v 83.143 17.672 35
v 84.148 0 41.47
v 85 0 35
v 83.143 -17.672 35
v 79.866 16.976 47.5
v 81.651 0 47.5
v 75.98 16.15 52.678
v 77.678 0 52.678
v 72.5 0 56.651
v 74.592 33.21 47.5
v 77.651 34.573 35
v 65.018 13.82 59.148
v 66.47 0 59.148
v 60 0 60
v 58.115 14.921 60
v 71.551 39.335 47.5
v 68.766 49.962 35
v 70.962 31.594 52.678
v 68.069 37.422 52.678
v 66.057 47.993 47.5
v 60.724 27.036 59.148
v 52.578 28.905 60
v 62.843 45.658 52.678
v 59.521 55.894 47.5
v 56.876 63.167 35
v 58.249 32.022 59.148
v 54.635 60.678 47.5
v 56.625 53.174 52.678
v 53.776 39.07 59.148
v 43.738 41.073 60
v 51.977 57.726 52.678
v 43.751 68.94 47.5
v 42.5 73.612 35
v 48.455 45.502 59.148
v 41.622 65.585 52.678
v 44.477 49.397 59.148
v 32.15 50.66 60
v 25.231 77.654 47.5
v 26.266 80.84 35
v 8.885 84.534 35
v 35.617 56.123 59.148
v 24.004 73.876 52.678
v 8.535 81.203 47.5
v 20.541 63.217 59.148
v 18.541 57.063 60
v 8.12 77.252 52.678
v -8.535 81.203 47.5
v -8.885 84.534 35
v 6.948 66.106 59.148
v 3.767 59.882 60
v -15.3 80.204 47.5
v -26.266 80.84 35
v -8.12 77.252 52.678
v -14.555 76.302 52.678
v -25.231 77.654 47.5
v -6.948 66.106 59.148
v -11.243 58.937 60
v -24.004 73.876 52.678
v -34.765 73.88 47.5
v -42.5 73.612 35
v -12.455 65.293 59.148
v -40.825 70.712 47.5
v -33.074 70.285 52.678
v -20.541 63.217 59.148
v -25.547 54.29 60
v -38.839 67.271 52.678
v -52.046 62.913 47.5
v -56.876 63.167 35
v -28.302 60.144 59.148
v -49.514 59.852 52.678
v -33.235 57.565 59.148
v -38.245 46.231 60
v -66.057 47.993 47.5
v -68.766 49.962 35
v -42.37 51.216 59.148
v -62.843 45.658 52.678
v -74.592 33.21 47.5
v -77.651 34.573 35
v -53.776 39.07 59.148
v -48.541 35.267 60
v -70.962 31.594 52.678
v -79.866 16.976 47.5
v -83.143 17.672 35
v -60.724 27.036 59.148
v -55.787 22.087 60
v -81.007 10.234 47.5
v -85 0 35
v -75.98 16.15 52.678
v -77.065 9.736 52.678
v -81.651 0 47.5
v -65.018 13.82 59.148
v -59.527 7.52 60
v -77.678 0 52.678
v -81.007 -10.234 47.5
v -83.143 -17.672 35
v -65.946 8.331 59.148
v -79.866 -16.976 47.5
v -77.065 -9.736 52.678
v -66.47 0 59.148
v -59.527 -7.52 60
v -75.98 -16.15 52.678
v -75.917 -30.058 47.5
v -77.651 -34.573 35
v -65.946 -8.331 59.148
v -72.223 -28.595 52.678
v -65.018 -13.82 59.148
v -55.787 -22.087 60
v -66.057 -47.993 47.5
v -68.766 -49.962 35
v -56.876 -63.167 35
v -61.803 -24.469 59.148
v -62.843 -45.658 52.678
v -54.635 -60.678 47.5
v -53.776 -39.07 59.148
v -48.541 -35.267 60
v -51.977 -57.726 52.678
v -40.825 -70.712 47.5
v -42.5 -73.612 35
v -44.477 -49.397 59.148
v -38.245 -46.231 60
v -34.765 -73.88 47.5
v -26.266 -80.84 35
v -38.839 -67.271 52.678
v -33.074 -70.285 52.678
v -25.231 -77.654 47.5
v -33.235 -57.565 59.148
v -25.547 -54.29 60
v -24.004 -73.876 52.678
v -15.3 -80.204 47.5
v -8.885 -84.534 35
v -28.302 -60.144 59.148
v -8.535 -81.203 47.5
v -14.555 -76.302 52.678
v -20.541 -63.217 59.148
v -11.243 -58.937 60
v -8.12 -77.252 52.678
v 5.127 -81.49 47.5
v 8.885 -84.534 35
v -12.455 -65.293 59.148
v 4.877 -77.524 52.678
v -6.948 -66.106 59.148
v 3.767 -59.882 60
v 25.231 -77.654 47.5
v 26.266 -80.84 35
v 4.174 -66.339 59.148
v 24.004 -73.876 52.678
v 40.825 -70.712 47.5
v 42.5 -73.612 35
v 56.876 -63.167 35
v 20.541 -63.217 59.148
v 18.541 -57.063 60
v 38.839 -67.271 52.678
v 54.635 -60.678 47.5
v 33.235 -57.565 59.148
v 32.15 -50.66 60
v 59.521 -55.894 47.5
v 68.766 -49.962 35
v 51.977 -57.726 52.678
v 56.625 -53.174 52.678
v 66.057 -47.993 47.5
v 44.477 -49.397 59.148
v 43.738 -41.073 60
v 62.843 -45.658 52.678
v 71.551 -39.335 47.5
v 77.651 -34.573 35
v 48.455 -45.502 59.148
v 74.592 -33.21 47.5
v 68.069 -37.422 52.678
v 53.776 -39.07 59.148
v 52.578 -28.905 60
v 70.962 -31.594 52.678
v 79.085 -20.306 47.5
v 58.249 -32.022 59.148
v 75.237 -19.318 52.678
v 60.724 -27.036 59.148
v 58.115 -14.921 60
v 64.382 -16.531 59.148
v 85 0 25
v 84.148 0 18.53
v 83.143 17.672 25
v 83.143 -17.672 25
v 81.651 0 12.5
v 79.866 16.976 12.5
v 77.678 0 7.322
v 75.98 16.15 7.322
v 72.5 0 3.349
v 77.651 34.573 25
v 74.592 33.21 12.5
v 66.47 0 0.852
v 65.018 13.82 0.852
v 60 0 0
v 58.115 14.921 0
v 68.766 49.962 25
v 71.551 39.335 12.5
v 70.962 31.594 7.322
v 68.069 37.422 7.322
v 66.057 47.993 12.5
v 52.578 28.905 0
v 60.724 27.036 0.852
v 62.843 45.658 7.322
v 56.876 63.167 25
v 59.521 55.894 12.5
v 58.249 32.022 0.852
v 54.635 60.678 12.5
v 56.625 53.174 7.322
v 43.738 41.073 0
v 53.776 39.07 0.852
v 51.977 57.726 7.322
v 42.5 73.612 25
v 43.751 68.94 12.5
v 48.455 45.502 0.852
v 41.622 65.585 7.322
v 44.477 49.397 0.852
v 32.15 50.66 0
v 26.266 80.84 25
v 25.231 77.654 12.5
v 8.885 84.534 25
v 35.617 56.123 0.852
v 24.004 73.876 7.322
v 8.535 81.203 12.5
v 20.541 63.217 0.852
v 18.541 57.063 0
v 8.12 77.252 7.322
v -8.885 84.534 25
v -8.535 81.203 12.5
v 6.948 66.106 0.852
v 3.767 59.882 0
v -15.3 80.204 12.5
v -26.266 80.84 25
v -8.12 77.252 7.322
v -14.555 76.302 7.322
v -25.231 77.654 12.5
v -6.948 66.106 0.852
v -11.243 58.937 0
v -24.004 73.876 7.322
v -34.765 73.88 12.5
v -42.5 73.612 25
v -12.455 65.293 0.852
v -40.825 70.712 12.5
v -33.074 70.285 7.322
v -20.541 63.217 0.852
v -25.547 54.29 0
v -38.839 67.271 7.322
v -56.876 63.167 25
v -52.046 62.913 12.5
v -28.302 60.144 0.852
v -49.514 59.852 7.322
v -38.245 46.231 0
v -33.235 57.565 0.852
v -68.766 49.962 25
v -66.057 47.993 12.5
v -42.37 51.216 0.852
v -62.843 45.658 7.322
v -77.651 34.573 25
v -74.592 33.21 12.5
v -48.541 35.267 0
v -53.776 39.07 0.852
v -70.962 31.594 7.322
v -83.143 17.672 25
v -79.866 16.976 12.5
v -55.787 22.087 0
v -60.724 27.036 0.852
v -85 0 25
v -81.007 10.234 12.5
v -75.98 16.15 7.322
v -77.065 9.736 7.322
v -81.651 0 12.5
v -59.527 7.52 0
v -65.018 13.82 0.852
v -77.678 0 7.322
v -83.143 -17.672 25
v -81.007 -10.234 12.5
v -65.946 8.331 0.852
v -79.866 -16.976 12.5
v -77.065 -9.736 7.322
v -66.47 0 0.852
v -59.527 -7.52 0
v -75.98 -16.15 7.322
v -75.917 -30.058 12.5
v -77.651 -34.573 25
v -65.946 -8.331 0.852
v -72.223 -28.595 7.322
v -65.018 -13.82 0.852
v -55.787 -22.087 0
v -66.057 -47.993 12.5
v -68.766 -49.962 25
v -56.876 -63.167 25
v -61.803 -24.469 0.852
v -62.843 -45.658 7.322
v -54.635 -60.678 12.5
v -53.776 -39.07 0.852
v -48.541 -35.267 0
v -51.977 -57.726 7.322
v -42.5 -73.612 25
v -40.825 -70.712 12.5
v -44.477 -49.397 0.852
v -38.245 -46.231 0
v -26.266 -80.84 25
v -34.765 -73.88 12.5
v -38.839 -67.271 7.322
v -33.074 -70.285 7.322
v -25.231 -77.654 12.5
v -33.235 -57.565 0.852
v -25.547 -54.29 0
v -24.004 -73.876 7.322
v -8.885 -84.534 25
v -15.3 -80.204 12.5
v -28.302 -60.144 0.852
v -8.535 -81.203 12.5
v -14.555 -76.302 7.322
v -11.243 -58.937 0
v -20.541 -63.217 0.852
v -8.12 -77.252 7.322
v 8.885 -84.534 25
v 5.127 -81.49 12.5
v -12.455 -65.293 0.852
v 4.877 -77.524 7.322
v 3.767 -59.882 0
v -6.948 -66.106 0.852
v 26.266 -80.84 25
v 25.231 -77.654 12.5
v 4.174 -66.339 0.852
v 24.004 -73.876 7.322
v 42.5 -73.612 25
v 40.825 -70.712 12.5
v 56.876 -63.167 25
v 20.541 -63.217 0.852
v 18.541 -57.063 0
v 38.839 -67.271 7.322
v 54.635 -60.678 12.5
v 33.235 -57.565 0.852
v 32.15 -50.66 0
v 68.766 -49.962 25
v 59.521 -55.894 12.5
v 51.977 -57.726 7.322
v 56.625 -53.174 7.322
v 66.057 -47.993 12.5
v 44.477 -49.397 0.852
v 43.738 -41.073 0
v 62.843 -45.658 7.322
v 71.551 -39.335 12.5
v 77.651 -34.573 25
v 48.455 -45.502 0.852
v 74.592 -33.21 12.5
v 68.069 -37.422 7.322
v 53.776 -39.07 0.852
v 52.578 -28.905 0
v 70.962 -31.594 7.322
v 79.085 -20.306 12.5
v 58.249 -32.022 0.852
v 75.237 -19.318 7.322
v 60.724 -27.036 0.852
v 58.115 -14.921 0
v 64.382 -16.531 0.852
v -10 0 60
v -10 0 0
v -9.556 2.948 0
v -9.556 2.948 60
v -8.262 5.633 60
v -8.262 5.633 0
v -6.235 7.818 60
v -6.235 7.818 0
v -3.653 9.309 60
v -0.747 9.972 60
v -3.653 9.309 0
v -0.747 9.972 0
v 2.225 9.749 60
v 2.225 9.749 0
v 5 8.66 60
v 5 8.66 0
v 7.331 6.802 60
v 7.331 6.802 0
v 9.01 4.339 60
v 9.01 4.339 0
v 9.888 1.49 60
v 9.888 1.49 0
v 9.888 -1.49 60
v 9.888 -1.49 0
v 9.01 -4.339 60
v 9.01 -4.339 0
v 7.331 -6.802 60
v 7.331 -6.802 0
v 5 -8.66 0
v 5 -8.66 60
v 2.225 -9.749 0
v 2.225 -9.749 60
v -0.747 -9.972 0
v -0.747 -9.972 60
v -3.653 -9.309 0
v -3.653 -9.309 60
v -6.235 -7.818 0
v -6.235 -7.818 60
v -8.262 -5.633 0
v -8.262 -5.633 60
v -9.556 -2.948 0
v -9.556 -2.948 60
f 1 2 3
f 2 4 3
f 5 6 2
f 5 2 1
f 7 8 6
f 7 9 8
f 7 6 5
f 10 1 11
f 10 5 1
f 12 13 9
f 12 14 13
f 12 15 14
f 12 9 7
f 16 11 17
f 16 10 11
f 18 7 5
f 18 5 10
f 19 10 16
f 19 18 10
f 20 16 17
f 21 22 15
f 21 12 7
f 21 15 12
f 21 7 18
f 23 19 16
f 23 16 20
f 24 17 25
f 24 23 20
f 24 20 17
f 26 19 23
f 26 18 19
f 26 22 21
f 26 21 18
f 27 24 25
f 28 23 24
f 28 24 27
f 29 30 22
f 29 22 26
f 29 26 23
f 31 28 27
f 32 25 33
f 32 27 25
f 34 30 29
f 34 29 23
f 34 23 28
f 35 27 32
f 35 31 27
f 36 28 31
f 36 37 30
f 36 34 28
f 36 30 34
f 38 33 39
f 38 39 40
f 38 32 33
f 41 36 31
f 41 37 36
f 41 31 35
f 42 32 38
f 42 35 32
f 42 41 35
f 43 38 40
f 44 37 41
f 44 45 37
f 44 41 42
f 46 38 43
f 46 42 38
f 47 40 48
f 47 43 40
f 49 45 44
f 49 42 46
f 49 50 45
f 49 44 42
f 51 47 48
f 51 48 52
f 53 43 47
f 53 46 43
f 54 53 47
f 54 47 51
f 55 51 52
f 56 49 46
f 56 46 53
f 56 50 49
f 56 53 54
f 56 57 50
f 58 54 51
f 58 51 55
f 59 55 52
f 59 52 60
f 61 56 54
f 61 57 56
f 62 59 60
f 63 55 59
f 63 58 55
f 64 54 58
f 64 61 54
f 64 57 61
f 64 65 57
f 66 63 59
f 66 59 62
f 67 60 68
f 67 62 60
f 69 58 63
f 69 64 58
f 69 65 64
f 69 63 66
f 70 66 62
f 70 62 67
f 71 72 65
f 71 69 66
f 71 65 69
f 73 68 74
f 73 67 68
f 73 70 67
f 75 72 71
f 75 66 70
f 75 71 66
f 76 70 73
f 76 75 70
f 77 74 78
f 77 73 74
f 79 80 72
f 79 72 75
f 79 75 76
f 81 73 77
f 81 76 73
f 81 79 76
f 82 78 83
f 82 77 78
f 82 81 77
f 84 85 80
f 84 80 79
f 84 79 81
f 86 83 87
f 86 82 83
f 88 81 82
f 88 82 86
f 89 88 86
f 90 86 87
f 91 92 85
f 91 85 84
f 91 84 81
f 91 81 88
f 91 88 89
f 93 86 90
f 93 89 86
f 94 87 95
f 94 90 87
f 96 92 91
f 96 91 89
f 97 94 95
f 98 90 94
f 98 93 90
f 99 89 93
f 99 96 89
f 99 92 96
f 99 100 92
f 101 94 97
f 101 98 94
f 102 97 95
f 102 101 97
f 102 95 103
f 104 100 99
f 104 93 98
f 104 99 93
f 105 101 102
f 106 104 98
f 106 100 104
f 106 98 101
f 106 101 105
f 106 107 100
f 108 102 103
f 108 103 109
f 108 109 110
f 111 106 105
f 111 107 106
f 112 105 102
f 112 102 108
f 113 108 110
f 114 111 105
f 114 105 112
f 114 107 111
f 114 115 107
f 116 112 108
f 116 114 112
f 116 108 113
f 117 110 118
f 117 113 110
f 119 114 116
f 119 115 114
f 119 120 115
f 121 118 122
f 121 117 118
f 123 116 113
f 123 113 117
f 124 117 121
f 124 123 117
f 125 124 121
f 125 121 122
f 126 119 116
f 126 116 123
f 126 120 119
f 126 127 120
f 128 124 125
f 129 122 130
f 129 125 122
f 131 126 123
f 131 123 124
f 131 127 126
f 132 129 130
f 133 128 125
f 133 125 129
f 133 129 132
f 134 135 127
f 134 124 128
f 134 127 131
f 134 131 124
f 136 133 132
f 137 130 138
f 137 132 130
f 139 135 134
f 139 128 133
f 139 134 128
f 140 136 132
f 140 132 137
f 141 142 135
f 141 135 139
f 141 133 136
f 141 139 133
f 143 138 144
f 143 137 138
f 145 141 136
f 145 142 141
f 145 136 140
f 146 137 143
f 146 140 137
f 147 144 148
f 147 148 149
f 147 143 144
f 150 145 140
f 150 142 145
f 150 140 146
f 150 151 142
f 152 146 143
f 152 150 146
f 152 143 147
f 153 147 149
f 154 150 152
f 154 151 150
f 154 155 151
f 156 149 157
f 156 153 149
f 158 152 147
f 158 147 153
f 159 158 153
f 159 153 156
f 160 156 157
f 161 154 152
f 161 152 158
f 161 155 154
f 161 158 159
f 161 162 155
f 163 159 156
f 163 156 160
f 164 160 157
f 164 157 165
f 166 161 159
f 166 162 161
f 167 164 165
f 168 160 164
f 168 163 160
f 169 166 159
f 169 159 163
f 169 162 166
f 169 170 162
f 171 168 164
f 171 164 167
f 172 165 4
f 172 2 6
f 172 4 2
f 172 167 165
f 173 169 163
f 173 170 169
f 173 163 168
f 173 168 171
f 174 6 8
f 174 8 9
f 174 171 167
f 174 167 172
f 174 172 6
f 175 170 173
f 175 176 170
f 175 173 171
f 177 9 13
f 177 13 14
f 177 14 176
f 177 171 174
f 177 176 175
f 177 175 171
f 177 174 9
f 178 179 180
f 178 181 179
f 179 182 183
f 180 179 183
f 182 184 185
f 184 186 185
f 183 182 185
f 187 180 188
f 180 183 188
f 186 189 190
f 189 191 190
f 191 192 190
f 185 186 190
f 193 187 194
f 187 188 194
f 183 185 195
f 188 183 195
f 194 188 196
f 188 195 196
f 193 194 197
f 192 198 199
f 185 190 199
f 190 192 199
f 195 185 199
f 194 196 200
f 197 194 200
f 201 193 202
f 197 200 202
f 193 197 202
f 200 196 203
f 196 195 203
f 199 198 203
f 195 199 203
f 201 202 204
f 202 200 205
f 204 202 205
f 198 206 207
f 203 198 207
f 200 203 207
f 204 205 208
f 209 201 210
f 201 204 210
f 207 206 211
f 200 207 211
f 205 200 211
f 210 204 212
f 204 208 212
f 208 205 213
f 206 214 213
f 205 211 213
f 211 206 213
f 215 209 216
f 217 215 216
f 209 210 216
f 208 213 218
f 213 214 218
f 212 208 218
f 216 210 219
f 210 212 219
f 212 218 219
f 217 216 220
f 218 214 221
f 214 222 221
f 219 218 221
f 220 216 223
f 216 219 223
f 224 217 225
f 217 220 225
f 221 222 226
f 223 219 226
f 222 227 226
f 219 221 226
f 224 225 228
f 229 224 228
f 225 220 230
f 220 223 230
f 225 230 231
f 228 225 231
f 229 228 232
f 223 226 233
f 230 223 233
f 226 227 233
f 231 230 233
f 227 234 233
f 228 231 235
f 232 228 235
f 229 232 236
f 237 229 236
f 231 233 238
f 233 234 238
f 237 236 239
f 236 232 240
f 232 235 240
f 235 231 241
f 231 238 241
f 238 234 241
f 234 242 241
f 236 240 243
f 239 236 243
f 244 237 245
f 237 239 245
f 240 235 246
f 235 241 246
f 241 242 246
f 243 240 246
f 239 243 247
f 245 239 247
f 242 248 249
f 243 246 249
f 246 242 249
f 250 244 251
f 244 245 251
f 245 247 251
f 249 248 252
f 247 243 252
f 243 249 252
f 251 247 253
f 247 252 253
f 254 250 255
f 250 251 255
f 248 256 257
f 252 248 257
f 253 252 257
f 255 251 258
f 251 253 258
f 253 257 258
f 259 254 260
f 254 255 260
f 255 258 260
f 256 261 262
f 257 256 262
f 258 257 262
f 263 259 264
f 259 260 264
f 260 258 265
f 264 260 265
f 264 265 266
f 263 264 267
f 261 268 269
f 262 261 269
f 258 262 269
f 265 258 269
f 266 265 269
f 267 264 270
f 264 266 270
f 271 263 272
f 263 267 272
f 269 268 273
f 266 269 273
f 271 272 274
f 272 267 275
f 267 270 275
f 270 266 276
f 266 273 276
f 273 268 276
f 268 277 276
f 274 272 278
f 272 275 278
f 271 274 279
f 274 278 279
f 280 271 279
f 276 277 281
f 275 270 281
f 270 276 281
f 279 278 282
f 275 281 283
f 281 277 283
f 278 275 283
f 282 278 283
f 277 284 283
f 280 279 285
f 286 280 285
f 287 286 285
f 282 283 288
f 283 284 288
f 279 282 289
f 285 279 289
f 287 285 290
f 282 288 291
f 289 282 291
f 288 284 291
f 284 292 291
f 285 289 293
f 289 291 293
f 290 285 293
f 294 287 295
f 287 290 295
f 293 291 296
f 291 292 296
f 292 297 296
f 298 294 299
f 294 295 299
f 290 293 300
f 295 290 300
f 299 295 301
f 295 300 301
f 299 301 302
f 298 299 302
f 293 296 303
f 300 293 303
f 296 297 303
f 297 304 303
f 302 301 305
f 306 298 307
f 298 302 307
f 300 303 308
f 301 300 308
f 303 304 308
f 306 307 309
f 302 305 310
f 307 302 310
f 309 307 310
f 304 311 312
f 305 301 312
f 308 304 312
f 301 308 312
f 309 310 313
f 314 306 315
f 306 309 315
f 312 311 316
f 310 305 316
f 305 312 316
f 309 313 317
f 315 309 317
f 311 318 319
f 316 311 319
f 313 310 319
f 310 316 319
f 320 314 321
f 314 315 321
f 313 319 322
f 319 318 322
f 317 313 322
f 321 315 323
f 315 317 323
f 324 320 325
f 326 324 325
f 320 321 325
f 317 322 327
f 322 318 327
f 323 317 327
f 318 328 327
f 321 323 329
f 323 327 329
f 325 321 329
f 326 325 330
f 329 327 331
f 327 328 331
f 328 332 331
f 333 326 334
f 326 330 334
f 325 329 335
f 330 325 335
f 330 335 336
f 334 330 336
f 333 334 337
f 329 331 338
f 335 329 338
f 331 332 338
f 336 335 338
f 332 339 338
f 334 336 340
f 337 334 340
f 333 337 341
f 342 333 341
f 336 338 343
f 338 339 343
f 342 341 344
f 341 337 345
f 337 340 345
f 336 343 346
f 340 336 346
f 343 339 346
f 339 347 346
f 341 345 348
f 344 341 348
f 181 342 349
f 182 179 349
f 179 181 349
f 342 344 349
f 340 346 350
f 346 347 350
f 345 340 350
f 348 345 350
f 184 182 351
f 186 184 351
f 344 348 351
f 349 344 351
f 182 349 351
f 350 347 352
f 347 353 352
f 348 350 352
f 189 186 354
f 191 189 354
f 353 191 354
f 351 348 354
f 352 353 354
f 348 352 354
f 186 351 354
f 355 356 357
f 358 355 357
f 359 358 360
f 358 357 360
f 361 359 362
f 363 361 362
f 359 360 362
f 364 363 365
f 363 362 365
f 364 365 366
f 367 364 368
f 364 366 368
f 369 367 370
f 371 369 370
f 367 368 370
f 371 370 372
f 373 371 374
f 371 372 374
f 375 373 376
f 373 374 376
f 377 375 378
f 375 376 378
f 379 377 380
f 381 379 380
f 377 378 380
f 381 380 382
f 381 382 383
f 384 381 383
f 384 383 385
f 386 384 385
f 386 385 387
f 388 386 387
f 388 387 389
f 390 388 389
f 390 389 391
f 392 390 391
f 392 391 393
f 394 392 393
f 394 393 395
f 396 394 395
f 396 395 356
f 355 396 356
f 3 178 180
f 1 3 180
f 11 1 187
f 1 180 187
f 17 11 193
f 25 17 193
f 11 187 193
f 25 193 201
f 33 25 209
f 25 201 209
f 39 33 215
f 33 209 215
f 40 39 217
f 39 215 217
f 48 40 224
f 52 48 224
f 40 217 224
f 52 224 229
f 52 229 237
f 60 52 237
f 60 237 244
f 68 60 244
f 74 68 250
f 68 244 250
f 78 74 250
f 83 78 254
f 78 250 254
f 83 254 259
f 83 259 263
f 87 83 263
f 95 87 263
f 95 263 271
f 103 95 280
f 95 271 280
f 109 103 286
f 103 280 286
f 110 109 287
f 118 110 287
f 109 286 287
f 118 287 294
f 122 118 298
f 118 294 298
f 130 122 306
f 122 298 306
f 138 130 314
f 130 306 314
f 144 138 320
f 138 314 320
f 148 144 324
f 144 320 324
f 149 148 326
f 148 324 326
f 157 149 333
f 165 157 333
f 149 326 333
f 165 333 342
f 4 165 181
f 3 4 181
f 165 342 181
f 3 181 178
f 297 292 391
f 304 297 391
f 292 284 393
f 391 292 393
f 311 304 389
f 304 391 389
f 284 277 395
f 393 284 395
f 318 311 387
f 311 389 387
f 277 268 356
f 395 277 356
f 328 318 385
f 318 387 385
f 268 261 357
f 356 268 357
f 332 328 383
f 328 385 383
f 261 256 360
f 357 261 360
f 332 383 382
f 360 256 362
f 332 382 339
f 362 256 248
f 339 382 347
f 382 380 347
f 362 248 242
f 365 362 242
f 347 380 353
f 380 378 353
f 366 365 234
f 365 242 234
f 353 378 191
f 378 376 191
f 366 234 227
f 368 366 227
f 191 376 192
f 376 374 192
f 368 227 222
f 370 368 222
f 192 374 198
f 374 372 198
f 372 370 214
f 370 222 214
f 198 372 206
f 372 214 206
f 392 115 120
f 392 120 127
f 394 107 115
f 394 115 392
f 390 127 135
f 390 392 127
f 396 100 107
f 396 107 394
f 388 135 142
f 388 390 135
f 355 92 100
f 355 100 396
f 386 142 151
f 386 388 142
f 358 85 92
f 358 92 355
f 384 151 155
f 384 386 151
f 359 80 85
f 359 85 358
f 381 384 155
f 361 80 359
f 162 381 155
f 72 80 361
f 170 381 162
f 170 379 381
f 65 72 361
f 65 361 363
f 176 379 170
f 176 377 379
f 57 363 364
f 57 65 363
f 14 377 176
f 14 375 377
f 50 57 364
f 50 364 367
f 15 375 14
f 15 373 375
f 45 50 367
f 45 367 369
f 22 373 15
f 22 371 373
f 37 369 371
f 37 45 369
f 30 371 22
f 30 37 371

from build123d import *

# Parameters (mm, degrees)
SKETCH1_R          = 85
WHEEL_DEPTH        = 60
FILLET1_R          = 25
SKETCH4_R          = 10
CUT_EXTRUDE1_DEPTH = 135.350288489


with BuildPart() as part:
    # Sketch1 → WHEEL (new body)
    with BuildSketch(Plane.XY):
        Circle(SKETCH1_R)
    extrude(amount=WHEEL_DEPTH)

    # Fillet1
    fillet1_edges = [part.edges().sort_by_distance(p)[0] for p in [
        (-85, 0, 0),
        (-85, 0, 60),
    ]]
    fillet(fillet1_edges, radius=FILLET1_R)

    # Sketch4 → Cut-Extrude1 (cut, through all)
    with BuildSketch(Plane(origin=(0, 0, 0), x_dir=(-1, 0, 0), z_dir=(0, 0, -1))):
        Circle(SKETCH4_R)
    extrude(amount=-CUT_EXTRUDE1_DEPTH, mode=Mode.SUBTRACT)


solid = part.part
